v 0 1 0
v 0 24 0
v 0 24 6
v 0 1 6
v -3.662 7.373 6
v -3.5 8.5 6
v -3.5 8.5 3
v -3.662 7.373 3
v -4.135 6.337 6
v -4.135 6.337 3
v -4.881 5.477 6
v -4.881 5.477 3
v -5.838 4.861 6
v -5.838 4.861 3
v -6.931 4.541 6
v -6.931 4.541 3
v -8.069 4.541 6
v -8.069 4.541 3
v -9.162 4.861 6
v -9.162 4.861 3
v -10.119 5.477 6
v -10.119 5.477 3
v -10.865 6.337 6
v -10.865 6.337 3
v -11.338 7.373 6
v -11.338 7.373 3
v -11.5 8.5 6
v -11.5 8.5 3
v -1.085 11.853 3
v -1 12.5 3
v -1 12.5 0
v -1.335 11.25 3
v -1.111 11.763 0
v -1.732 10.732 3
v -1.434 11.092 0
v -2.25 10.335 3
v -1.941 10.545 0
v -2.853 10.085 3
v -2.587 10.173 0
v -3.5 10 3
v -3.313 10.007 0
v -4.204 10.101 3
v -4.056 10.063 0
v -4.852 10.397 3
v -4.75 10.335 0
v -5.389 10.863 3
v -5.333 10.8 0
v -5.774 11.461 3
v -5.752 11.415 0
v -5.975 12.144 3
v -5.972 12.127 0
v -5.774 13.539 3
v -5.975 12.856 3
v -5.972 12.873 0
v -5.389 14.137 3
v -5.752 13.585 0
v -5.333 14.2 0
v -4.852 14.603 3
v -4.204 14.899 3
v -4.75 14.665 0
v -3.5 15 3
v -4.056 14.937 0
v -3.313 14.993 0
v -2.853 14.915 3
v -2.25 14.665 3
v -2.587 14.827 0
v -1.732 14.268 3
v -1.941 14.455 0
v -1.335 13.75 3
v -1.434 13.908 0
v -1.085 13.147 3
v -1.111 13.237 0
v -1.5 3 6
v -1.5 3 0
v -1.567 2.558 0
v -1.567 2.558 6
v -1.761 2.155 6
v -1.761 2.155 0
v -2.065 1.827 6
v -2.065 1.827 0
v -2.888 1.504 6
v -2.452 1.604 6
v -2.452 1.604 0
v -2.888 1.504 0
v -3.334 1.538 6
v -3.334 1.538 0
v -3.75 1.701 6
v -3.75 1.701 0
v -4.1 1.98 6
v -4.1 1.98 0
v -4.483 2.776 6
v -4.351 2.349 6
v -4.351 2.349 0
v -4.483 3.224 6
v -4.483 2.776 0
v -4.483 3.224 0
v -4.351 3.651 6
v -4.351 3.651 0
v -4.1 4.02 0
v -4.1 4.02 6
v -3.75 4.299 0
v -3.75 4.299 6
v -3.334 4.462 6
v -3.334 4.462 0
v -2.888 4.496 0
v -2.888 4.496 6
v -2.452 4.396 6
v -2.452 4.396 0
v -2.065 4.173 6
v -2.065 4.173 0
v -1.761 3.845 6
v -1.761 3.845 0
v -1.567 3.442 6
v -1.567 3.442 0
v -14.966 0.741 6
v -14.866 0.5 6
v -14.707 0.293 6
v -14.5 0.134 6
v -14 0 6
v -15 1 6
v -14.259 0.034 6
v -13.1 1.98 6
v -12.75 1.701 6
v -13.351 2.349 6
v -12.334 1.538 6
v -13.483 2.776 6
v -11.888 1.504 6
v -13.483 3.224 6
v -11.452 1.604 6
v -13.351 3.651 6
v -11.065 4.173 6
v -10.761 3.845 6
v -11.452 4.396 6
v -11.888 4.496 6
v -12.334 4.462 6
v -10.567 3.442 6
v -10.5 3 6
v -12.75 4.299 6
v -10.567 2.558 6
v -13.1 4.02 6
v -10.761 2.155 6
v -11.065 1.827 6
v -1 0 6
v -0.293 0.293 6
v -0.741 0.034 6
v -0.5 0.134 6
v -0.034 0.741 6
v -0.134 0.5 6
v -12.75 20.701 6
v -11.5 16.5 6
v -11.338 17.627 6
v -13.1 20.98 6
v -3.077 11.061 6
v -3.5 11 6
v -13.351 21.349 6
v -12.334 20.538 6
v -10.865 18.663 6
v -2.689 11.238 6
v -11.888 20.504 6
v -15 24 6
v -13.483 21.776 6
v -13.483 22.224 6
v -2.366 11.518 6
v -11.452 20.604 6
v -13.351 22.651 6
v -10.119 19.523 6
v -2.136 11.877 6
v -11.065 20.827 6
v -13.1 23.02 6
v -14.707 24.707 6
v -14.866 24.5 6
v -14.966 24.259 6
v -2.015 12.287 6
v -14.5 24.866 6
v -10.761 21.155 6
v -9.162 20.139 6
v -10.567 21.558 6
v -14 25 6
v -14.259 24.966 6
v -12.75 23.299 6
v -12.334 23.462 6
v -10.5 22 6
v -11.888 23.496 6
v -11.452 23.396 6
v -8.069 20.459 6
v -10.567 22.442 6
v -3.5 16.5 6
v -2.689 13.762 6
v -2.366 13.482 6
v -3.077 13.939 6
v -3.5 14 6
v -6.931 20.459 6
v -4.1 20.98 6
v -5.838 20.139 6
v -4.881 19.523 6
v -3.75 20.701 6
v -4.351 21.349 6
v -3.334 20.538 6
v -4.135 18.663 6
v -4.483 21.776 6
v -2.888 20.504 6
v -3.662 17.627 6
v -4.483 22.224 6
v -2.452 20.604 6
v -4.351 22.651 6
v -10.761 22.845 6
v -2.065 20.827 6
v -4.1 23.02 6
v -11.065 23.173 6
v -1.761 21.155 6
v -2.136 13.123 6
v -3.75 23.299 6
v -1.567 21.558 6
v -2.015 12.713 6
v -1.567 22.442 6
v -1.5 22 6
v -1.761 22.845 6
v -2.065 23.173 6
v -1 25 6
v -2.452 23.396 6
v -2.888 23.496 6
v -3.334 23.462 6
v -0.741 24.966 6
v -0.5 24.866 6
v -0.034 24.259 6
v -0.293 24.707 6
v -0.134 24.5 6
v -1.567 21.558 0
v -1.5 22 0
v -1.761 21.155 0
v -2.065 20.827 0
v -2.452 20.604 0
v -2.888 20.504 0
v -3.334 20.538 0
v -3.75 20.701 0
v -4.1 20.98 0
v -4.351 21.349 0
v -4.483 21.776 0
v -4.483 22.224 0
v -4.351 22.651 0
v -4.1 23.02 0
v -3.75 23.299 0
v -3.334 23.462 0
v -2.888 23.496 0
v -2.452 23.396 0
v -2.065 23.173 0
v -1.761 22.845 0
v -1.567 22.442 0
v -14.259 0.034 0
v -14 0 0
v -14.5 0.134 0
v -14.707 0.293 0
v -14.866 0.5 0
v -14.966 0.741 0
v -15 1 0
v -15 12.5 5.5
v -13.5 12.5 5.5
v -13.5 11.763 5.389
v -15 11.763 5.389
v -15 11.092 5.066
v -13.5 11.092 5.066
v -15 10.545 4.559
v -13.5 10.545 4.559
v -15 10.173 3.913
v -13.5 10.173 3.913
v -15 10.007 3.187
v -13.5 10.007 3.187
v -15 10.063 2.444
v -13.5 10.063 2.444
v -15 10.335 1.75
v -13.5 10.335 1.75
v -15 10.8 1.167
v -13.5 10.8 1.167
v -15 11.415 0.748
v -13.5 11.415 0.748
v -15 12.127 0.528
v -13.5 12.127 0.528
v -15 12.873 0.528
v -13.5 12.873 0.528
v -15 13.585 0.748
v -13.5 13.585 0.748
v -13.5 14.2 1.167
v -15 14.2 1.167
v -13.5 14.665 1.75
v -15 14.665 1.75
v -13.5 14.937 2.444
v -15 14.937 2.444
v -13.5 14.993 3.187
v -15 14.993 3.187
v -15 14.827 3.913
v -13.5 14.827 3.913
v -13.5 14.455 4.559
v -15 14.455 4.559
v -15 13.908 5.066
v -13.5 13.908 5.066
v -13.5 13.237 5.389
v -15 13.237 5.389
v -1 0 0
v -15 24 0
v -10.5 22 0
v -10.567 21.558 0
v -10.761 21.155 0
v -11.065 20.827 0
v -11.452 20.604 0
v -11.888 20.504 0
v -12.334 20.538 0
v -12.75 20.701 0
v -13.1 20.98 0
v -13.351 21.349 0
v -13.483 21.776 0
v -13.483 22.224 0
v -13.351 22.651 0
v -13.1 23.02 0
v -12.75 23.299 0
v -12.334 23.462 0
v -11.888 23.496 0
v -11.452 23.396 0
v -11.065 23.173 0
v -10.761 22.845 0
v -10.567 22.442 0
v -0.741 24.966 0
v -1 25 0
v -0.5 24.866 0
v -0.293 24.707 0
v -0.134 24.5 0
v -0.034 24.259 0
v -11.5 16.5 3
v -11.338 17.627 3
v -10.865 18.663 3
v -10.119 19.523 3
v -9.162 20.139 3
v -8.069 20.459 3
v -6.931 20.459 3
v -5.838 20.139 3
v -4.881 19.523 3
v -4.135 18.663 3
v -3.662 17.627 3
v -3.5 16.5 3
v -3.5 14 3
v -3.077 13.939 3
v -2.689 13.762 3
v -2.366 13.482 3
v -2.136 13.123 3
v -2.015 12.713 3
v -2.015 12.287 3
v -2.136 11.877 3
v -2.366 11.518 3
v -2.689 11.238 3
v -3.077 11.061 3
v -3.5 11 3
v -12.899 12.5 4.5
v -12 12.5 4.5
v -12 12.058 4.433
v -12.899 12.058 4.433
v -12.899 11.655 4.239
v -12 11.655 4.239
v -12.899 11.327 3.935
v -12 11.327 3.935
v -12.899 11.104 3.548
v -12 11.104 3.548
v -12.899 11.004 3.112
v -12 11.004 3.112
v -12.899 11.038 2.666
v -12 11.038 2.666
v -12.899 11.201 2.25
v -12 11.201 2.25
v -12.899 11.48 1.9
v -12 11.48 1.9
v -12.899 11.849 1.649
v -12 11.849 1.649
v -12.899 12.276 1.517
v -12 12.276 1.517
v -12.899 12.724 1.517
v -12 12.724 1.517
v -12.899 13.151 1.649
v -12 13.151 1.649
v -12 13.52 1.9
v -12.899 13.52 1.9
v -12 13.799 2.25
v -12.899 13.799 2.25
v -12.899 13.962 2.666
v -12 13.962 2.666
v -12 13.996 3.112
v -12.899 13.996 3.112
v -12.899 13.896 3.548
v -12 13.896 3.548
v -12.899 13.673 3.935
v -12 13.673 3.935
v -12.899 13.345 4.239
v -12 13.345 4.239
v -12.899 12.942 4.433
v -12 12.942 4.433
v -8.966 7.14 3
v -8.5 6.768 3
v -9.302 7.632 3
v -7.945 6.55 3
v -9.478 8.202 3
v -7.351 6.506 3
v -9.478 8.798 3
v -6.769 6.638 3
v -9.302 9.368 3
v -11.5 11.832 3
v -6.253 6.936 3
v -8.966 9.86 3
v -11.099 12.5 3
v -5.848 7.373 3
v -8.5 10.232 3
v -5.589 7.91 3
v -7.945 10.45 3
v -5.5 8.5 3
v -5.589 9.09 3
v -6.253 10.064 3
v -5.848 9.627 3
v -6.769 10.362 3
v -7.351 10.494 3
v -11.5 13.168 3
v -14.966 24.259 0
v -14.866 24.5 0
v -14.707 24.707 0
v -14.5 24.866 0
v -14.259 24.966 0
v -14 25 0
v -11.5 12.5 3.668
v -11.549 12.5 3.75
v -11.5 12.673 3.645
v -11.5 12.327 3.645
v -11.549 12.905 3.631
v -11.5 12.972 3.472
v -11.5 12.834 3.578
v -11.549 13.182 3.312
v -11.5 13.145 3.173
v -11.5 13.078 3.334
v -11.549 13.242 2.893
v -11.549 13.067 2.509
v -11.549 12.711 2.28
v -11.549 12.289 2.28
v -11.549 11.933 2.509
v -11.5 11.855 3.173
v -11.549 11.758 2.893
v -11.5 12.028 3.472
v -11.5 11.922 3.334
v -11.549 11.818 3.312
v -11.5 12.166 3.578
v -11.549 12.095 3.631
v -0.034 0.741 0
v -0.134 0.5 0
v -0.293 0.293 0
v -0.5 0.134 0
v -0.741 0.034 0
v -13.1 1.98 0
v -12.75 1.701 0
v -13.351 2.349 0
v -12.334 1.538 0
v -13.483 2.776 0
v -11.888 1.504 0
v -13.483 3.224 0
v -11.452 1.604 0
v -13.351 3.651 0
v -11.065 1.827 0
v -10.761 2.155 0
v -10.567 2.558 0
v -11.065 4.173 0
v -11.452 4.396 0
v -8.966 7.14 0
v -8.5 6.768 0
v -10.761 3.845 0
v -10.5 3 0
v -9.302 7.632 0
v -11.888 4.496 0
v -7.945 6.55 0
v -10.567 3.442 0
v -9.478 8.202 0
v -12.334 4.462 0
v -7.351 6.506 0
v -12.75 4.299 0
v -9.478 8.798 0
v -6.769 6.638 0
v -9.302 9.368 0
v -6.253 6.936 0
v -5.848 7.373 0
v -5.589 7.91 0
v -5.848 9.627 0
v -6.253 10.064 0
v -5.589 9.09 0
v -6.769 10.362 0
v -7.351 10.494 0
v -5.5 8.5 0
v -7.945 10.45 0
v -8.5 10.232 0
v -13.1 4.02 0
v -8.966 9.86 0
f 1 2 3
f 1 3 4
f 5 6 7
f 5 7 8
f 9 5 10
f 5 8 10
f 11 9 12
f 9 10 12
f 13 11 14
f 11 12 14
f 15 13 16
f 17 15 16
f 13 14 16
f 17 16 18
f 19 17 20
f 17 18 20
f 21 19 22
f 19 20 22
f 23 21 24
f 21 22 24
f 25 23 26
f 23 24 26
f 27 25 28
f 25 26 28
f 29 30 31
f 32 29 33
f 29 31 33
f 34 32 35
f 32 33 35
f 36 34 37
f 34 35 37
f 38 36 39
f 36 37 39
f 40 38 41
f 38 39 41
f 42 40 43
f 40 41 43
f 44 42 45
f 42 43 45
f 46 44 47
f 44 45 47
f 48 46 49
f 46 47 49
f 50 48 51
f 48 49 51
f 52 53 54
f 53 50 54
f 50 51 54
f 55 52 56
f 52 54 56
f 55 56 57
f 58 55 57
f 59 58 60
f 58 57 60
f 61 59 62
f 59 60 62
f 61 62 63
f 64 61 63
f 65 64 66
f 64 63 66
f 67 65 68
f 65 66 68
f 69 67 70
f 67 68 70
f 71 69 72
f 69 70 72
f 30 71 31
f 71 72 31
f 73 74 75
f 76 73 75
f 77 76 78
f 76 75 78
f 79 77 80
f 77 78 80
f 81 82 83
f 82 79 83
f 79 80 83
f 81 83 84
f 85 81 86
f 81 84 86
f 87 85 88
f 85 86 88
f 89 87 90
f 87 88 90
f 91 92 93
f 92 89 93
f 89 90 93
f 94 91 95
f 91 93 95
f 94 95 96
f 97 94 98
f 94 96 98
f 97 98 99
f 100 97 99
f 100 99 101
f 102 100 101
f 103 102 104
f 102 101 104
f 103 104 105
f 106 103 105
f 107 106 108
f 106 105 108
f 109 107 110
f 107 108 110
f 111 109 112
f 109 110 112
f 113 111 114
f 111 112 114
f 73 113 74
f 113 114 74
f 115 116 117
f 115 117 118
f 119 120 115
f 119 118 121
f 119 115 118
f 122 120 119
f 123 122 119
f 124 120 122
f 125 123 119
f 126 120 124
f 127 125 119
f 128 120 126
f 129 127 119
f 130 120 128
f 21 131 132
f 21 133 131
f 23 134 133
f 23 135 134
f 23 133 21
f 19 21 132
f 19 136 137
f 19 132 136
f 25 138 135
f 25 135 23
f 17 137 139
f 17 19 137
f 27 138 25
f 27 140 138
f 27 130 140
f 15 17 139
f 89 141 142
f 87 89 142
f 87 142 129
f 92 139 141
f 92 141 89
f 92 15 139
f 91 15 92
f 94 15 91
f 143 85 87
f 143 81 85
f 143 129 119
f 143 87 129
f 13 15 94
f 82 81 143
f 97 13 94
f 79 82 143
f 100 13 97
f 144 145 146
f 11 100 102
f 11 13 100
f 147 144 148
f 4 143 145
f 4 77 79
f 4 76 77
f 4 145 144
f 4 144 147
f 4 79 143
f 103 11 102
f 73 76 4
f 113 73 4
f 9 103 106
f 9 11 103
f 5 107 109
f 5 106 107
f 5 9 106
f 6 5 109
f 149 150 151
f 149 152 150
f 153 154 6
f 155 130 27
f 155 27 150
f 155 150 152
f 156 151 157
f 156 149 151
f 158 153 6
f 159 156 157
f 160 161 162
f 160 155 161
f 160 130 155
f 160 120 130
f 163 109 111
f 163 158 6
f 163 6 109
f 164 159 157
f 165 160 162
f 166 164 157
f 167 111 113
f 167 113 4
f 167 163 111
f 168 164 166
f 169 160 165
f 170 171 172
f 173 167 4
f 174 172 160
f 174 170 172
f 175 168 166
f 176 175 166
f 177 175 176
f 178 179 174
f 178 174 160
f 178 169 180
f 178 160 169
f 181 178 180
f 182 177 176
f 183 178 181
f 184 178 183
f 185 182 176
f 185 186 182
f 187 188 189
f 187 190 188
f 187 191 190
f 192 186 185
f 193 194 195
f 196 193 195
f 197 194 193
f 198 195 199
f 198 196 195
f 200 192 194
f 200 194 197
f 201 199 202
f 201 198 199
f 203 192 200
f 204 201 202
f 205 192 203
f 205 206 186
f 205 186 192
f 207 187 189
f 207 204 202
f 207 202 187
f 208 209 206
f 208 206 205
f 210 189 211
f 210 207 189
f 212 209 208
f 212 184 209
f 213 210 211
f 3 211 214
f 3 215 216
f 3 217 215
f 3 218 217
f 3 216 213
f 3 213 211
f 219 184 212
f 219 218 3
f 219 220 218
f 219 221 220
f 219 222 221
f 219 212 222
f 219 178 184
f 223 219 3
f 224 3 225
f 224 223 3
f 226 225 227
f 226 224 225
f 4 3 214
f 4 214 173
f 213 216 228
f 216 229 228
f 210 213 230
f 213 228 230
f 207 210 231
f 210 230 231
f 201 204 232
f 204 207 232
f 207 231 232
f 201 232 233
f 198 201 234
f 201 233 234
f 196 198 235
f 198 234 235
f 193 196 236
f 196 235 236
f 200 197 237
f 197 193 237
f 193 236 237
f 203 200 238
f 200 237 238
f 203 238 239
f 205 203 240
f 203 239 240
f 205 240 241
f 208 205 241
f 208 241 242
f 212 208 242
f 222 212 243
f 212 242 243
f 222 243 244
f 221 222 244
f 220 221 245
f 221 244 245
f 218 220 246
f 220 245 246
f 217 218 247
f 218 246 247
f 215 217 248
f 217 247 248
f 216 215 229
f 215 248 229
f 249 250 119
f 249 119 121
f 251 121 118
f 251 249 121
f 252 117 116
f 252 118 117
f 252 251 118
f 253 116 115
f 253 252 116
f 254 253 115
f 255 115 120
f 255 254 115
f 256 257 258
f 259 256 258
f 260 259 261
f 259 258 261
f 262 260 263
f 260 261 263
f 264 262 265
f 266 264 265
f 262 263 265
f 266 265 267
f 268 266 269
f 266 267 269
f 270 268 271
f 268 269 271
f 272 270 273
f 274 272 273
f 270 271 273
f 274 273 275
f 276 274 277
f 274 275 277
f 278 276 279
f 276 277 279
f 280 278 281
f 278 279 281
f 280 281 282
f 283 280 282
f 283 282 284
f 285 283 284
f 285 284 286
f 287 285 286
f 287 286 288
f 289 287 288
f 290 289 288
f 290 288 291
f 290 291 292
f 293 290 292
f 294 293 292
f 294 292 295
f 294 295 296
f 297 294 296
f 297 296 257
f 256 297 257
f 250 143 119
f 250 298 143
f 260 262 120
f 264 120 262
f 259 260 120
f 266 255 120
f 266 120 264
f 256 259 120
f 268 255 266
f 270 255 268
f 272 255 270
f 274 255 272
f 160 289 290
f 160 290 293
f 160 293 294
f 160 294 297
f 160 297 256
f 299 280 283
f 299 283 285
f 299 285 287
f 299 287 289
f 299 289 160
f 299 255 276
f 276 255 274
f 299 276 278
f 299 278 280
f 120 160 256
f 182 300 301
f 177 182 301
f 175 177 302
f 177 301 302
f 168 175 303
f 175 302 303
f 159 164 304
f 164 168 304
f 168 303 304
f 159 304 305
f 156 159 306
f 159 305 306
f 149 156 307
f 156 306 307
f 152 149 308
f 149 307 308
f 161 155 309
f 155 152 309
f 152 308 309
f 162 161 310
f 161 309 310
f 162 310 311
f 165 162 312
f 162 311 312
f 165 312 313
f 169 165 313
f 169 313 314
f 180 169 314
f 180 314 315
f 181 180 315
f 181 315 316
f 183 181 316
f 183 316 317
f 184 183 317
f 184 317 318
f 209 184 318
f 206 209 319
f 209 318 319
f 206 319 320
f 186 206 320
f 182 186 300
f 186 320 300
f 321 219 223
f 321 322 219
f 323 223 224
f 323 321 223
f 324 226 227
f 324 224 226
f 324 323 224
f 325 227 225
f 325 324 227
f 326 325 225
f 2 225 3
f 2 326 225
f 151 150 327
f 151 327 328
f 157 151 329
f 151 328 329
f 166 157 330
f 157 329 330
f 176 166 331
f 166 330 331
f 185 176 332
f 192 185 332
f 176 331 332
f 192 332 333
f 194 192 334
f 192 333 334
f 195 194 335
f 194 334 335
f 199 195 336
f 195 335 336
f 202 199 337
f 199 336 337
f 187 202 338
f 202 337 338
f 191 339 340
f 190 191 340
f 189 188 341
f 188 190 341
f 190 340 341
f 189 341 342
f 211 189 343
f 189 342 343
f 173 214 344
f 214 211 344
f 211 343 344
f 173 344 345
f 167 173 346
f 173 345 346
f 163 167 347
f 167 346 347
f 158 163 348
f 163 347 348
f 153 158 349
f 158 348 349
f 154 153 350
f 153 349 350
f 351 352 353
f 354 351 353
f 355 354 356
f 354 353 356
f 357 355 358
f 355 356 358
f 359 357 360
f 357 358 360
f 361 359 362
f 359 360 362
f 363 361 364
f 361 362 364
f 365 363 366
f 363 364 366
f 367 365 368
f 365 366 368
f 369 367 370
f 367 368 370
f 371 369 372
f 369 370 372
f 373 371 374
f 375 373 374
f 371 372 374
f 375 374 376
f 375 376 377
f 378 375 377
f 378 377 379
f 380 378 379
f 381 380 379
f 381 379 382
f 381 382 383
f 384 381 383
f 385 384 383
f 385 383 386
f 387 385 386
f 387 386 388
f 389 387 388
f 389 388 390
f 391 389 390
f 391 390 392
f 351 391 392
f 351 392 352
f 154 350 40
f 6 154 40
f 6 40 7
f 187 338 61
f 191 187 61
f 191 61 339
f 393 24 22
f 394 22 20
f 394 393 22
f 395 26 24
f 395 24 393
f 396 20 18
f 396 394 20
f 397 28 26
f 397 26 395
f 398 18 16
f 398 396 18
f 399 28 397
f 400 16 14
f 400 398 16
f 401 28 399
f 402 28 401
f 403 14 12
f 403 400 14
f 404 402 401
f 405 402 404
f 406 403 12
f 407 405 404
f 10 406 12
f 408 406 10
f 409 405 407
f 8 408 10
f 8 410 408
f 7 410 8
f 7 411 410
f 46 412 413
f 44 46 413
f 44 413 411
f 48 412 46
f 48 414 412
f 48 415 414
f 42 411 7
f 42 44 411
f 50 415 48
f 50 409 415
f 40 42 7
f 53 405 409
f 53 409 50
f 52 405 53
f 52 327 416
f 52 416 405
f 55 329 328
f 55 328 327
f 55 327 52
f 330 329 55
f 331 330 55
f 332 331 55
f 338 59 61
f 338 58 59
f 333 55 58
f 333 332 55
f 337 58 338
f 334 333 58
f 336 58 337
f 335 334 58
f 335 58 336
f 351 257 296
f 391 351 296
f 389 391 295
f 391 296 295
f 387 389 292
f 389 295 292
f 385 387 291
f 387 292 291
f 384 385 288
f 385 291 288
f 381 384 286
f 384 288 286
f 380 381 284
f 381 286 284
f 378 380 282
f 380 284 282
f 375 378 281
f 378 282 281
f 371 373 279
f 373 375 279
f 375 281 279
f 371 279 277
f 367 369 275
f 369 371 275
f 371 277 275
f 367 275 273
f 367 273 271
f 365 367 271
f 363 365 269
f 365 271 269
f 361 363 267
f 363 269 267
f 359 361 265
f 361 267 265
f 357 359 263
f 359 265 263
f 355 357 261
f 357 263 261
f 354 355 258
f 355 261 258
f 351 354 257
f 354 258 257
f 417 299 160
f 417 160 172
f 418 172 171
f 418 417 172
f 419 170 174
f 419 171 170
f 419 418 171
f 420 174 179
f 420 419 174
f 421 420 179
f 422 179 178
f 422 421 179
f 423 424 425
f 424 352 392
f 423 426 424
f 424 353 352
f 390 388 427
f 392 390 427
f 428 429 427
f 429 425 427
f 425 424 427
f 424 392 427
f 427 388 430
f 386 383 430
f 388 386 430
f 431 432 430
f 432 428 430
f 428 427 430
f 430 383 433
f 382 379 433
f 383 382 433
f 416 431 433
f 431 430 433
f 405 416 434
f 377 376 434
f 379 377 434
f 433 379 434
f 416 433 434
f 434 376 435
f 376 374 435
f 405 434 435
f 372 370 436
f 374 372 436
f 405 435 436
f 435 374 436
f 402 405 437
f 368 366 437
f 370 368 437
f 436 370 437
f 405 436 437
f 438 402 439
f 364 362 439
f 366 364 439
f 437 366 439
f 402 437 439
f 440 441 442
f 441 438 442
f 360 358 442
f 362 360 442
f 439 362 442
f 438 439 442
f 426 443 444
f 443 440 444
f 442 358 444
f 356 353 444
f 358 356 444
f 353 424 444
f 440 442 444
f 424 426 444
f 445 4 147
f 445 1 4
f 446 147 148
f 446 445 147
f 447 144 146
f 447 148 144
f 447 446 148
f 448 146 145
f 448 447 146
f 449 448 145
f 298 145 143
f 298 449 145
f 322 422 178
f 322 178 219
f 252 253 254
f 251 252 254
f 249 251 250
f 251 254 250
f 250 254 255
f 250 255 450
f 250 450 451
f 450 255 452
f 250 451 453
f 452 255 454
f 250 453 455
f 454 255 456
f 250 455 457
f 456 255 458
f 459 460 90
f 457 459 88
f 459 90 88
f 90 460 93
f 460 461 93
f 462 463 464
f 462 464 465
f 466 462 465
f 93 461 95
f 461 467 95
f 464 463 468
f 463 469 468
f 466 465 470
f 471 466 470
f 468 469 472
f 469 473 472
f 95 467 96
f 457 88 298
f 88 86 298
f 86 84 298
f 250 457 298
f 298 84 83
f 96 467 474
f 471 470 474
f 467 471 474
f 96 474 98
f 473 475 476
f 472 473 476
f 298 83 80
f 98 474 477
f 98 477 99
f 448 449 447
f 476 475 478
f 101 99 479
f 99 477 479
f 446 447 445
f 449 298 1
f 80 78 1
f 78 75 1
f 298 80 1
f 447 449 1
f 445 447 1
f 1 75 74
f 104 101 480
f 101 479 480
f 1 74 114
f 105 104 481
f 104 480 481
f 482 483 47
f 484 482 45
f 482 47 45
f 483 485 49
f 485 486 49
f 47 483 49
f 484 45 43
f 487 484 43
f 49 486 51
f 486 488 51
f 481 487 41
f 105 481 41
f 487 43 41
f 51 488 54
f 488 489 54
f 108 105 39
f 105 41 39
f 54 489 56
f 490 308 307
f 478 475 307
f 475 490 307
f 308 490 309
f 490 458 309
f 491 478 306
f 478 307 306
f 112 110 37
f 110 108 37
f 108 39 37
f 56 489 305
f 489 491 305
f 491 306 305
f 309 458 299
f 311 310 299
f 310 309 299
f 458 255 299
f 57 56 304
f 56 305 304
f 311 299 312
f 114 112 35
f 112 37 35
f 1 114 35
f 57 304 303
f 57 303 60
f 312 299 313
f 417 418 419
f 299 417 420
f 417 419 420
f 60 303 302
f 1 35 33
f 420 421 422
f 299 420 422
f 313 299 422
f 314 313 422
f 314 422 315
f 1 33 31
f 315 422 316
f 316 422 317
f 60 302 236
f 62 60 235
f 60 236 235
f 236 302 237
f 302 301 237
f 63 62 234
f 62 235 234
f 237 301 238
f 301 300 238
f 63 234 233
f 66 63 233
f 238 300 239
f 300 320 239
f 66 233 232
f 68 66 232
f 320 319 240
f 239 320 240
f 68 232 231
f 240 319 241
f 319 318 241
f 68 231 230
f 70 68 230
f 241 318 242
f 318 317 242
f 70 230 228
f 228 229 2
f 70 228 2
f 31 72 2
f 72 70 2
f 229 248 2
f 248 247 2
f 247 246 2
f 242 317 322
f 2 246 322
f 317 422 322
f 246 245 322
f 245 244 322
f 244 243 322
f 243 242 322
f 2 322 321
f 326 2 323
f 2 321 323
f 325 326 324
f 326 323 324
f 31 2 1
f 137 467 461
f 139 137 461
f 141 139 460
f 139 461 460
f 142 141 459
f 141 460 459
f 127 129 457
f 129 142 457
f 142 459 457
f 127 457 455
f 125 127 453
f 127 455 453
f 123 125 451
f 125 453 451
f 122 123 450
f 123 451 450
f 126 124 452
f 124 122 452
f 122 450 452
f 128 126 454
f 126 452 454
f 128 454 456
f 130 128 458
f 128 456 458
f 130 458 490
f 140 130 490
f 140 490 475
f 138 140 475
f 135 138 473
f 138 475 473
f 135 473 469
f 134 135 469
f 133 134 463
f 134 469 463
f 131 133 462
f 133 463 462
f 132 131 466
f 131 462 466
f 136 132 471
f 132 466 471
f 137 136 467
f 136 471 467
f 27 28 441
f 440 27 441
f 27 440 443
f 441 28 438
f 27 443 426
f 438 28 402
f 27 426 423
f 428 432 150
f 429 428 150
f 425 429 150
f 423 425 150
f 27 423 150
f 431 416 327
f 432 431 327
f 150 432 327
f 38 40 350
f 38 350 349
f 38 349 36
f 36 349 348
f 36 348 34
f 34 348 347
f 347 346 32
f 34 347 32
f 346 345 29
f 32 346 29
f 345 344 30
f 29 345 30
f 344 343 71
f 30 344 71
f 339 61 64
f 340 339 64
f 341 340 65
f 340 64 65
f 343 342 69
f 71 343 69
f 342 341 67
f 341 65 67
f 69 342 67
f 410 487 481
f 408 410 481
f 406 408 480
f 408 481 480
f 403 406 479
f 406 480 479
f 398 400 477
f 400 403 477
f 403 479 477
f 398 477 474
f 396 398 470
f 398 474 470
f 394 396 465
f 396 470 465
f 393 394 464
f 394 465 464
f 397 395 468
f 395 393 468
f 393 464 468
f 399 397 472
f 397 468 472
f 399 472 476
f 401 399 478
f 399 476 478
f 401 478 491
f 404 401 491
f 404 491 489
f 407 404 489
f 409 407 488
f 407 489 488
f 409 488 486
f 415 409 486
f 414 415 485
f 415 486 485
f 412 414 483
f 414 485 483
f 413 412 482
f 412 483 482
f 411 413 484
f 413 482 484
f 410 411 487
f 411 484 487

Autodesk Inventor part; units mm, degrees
ref_plane "YZ Plane" through (0, 0, 0) normal (1, 0, 0) x (0, 1, 0)
ref_plane "XZ Plane" through (0, 0, 0) normal (0, 1, 0) x (-1, 0, 0)
ref_plane "XY Plane" through (0, 0, 0) normal (0, 0, 1) x (1, 0, 0)
sketch "Szkic1" plane through (0, 0, 0) normal (0, 0, 1) x (1, 0, 0)
  line L0 (-1, 0) -> (-14, 0)
  line L1 (-15, 1) -> (-15, 24)
  line L2 (-14, 25) -> (-1, 25)
  line L3 (0, 24) -> (0, 1)
  arc A0 (-14, 25) -> (-15, 24) centre (-14, 24) ccw
  arc A1 (0, 24) -> (-1, 25) centre (-1, 24) ccw
  arc A2 (-1, 0) -> (0, 1) centre (-1, 1) ccw
  arc A3 (-15, 1) -> (-14, 0) centre (-14, 1) ccw
  circle A4 centre (-3, 3) radius 1.5
  circle A5 centre (-12, 3) radius 1.5
  circle A6 centre (-12, 22) radius 1.5
  circle A7 centre (-3, 22) radius 1.5
  circle A8 centre (-7.5, 8.5) radius 2
  circle A9 centre (-3.5, 12.5) radius 2.5
  point P0 (0, 0)
  point P1 (-15, 25)
  point P2 (-15, 0)
  point P3 (0, 25)
  point P4 (-11.5, 20.5)
  point P5 (-11.5, 4.5)
  point P6 (-3.5, 20.5)
  dimension "d0" = 15
  dimension "d1" = 25
  dimension "d2" = 1
  dimension "d3" = 3
  dimension "d4" = 3
  dimension "d5" = 3
  dimension "d6" = 3
  dimension "d7" = 8
  dimension "d8" = 16
  dimension "d10" = 19
  dimension "d11" = 4
  dimension "d72" = 5
extrude "Wyciągnięcie proste2" add sketch "Szkic1" along normal blind 3
sketch "Szkic12" plane through (0, 0, 3) normal (0, 0, 1) x (1, 0, 0)
  line L0 (-1, 0) -> (-14, 0)
  line L1 (-15, 1) -> (-15, 24)
  line L2 (-14, 25) -> (-1, 25)
  line L3 (0, 24) -> (0, 1)
  arc A0 (-14, 25) -> (-15, 24) centre (-14, 24) ccw
  arc A1 (0, 24) -> (-1, 25) centre (-1, 24) ccw
  arc A2 (-1, 0) -> (0, 1) centre (-1, 1) ccw
  arc A3 (-15, 1) -> (-14, 0) centre (-14, 1) ccw
  circle A4 centre (-3, 3) radius 1.5
  circle A5 centre (-12, 3) radius 1.5
  circle A6 centre (-12, 22) radius 1.5
  circle A7 centre (-3, 22) radius 1.5
  circle A8 centre (-7.5, 8.5) radius 2
  circle A9 centre (-3.5, 12.5) radius 2.5
  line L4 (-7.5, 4.5) -> (-7.5, 4.5)
  line L5 (-11.5, 8.5) -> (-11.5, 16.5)
  line L6 (-7.5, 20.5) -> (-7.5, 20.5)
  line L7 (-3.5, 16.5) -> (-3.5, 8.5)
  arc A10 (-7.5, 20.5) -> (-11.5, 16.5) centre (-7.5, 16.5) ccw
  arc A11 (-3.5, 16.5) -> (-7.5, 20.5) centre (-7.5, 16.5) ccw
  arc A12 (-7.5, 4.5) -> (-3.5, 8.5) centre (-7.5, 8.5) ccw
  arc A13 (-11.5, 8.5) -> (-7.5, 4.5) centre (-7.5, 8.5) ccw
  arc A14 (-3.5, 11) -> (-3.5, 14) centre (-3.5, 12.5) ccw
  point P0 (0, 0)
  point P1 (0, 0)
  point P2 (-15, 25)
  point P3 (-15, 0)
  point P4 (0, 25)
  point P5 (-11.5, 20.5)
  point P6 (-11.5, 4.5)
  point P7 (-3.5, 20.5)
  point P8 (-11.5, 4.5)
  point P9 (-3.5, 20.5)
  dimension "d38" = 15
  dimension "d39" = 25
  dimension "d40" = 1
  dimension "d41" = 3
  dimension "d42" = 3
  dimension "d43" = 3
  dimension "d44" = 3
  dimension "d45" = 8
  dimension "d46" = 16
  dimension "d47" = 19
  dimension "d48" = 4
  dimension "d49" = 8
  dimension "d50" = 16
  dimension "d51" = 4
  dimension "d52" = 3
extrude "Wyciągnięcie proste3" add sketch "Szkic12" along normal blind 3 contours L0 A3 L1 A0 L2 A1 L3 A2 | A9 L7 A14
sketch "Szkic16" plane through (-15, 1, 0) normal (-1, 0, 0) x (0, 0, 1)
  circle A0 centre (3, 11.5) radius 2.5
  line L0 (0, 14) -> (0, 9) projected
  point P0 (0, -1)
  dimension "d55" = 5
hole "Otwór2" at (-15, 12.5, 3) direction (1, 0, 0) diameter 5 depth 1.5 tip angle 118
sketch "Szkic17" plane through (-15, 1, 0) normal (-1, 0, 0) x (0, 0, 1)
  line L0 (3, 14) -> (3, 9) projected
  circle A0 centre (3, 11.5) radius 1.5
  point P0 (0, -1)
  dimension "d64" = 3
hole "Otwór3" at (-15, 12.5, 3) direction (1, 0, 0) diameter 3 depth 3 tip angle 118
properties part number "zad 7"
